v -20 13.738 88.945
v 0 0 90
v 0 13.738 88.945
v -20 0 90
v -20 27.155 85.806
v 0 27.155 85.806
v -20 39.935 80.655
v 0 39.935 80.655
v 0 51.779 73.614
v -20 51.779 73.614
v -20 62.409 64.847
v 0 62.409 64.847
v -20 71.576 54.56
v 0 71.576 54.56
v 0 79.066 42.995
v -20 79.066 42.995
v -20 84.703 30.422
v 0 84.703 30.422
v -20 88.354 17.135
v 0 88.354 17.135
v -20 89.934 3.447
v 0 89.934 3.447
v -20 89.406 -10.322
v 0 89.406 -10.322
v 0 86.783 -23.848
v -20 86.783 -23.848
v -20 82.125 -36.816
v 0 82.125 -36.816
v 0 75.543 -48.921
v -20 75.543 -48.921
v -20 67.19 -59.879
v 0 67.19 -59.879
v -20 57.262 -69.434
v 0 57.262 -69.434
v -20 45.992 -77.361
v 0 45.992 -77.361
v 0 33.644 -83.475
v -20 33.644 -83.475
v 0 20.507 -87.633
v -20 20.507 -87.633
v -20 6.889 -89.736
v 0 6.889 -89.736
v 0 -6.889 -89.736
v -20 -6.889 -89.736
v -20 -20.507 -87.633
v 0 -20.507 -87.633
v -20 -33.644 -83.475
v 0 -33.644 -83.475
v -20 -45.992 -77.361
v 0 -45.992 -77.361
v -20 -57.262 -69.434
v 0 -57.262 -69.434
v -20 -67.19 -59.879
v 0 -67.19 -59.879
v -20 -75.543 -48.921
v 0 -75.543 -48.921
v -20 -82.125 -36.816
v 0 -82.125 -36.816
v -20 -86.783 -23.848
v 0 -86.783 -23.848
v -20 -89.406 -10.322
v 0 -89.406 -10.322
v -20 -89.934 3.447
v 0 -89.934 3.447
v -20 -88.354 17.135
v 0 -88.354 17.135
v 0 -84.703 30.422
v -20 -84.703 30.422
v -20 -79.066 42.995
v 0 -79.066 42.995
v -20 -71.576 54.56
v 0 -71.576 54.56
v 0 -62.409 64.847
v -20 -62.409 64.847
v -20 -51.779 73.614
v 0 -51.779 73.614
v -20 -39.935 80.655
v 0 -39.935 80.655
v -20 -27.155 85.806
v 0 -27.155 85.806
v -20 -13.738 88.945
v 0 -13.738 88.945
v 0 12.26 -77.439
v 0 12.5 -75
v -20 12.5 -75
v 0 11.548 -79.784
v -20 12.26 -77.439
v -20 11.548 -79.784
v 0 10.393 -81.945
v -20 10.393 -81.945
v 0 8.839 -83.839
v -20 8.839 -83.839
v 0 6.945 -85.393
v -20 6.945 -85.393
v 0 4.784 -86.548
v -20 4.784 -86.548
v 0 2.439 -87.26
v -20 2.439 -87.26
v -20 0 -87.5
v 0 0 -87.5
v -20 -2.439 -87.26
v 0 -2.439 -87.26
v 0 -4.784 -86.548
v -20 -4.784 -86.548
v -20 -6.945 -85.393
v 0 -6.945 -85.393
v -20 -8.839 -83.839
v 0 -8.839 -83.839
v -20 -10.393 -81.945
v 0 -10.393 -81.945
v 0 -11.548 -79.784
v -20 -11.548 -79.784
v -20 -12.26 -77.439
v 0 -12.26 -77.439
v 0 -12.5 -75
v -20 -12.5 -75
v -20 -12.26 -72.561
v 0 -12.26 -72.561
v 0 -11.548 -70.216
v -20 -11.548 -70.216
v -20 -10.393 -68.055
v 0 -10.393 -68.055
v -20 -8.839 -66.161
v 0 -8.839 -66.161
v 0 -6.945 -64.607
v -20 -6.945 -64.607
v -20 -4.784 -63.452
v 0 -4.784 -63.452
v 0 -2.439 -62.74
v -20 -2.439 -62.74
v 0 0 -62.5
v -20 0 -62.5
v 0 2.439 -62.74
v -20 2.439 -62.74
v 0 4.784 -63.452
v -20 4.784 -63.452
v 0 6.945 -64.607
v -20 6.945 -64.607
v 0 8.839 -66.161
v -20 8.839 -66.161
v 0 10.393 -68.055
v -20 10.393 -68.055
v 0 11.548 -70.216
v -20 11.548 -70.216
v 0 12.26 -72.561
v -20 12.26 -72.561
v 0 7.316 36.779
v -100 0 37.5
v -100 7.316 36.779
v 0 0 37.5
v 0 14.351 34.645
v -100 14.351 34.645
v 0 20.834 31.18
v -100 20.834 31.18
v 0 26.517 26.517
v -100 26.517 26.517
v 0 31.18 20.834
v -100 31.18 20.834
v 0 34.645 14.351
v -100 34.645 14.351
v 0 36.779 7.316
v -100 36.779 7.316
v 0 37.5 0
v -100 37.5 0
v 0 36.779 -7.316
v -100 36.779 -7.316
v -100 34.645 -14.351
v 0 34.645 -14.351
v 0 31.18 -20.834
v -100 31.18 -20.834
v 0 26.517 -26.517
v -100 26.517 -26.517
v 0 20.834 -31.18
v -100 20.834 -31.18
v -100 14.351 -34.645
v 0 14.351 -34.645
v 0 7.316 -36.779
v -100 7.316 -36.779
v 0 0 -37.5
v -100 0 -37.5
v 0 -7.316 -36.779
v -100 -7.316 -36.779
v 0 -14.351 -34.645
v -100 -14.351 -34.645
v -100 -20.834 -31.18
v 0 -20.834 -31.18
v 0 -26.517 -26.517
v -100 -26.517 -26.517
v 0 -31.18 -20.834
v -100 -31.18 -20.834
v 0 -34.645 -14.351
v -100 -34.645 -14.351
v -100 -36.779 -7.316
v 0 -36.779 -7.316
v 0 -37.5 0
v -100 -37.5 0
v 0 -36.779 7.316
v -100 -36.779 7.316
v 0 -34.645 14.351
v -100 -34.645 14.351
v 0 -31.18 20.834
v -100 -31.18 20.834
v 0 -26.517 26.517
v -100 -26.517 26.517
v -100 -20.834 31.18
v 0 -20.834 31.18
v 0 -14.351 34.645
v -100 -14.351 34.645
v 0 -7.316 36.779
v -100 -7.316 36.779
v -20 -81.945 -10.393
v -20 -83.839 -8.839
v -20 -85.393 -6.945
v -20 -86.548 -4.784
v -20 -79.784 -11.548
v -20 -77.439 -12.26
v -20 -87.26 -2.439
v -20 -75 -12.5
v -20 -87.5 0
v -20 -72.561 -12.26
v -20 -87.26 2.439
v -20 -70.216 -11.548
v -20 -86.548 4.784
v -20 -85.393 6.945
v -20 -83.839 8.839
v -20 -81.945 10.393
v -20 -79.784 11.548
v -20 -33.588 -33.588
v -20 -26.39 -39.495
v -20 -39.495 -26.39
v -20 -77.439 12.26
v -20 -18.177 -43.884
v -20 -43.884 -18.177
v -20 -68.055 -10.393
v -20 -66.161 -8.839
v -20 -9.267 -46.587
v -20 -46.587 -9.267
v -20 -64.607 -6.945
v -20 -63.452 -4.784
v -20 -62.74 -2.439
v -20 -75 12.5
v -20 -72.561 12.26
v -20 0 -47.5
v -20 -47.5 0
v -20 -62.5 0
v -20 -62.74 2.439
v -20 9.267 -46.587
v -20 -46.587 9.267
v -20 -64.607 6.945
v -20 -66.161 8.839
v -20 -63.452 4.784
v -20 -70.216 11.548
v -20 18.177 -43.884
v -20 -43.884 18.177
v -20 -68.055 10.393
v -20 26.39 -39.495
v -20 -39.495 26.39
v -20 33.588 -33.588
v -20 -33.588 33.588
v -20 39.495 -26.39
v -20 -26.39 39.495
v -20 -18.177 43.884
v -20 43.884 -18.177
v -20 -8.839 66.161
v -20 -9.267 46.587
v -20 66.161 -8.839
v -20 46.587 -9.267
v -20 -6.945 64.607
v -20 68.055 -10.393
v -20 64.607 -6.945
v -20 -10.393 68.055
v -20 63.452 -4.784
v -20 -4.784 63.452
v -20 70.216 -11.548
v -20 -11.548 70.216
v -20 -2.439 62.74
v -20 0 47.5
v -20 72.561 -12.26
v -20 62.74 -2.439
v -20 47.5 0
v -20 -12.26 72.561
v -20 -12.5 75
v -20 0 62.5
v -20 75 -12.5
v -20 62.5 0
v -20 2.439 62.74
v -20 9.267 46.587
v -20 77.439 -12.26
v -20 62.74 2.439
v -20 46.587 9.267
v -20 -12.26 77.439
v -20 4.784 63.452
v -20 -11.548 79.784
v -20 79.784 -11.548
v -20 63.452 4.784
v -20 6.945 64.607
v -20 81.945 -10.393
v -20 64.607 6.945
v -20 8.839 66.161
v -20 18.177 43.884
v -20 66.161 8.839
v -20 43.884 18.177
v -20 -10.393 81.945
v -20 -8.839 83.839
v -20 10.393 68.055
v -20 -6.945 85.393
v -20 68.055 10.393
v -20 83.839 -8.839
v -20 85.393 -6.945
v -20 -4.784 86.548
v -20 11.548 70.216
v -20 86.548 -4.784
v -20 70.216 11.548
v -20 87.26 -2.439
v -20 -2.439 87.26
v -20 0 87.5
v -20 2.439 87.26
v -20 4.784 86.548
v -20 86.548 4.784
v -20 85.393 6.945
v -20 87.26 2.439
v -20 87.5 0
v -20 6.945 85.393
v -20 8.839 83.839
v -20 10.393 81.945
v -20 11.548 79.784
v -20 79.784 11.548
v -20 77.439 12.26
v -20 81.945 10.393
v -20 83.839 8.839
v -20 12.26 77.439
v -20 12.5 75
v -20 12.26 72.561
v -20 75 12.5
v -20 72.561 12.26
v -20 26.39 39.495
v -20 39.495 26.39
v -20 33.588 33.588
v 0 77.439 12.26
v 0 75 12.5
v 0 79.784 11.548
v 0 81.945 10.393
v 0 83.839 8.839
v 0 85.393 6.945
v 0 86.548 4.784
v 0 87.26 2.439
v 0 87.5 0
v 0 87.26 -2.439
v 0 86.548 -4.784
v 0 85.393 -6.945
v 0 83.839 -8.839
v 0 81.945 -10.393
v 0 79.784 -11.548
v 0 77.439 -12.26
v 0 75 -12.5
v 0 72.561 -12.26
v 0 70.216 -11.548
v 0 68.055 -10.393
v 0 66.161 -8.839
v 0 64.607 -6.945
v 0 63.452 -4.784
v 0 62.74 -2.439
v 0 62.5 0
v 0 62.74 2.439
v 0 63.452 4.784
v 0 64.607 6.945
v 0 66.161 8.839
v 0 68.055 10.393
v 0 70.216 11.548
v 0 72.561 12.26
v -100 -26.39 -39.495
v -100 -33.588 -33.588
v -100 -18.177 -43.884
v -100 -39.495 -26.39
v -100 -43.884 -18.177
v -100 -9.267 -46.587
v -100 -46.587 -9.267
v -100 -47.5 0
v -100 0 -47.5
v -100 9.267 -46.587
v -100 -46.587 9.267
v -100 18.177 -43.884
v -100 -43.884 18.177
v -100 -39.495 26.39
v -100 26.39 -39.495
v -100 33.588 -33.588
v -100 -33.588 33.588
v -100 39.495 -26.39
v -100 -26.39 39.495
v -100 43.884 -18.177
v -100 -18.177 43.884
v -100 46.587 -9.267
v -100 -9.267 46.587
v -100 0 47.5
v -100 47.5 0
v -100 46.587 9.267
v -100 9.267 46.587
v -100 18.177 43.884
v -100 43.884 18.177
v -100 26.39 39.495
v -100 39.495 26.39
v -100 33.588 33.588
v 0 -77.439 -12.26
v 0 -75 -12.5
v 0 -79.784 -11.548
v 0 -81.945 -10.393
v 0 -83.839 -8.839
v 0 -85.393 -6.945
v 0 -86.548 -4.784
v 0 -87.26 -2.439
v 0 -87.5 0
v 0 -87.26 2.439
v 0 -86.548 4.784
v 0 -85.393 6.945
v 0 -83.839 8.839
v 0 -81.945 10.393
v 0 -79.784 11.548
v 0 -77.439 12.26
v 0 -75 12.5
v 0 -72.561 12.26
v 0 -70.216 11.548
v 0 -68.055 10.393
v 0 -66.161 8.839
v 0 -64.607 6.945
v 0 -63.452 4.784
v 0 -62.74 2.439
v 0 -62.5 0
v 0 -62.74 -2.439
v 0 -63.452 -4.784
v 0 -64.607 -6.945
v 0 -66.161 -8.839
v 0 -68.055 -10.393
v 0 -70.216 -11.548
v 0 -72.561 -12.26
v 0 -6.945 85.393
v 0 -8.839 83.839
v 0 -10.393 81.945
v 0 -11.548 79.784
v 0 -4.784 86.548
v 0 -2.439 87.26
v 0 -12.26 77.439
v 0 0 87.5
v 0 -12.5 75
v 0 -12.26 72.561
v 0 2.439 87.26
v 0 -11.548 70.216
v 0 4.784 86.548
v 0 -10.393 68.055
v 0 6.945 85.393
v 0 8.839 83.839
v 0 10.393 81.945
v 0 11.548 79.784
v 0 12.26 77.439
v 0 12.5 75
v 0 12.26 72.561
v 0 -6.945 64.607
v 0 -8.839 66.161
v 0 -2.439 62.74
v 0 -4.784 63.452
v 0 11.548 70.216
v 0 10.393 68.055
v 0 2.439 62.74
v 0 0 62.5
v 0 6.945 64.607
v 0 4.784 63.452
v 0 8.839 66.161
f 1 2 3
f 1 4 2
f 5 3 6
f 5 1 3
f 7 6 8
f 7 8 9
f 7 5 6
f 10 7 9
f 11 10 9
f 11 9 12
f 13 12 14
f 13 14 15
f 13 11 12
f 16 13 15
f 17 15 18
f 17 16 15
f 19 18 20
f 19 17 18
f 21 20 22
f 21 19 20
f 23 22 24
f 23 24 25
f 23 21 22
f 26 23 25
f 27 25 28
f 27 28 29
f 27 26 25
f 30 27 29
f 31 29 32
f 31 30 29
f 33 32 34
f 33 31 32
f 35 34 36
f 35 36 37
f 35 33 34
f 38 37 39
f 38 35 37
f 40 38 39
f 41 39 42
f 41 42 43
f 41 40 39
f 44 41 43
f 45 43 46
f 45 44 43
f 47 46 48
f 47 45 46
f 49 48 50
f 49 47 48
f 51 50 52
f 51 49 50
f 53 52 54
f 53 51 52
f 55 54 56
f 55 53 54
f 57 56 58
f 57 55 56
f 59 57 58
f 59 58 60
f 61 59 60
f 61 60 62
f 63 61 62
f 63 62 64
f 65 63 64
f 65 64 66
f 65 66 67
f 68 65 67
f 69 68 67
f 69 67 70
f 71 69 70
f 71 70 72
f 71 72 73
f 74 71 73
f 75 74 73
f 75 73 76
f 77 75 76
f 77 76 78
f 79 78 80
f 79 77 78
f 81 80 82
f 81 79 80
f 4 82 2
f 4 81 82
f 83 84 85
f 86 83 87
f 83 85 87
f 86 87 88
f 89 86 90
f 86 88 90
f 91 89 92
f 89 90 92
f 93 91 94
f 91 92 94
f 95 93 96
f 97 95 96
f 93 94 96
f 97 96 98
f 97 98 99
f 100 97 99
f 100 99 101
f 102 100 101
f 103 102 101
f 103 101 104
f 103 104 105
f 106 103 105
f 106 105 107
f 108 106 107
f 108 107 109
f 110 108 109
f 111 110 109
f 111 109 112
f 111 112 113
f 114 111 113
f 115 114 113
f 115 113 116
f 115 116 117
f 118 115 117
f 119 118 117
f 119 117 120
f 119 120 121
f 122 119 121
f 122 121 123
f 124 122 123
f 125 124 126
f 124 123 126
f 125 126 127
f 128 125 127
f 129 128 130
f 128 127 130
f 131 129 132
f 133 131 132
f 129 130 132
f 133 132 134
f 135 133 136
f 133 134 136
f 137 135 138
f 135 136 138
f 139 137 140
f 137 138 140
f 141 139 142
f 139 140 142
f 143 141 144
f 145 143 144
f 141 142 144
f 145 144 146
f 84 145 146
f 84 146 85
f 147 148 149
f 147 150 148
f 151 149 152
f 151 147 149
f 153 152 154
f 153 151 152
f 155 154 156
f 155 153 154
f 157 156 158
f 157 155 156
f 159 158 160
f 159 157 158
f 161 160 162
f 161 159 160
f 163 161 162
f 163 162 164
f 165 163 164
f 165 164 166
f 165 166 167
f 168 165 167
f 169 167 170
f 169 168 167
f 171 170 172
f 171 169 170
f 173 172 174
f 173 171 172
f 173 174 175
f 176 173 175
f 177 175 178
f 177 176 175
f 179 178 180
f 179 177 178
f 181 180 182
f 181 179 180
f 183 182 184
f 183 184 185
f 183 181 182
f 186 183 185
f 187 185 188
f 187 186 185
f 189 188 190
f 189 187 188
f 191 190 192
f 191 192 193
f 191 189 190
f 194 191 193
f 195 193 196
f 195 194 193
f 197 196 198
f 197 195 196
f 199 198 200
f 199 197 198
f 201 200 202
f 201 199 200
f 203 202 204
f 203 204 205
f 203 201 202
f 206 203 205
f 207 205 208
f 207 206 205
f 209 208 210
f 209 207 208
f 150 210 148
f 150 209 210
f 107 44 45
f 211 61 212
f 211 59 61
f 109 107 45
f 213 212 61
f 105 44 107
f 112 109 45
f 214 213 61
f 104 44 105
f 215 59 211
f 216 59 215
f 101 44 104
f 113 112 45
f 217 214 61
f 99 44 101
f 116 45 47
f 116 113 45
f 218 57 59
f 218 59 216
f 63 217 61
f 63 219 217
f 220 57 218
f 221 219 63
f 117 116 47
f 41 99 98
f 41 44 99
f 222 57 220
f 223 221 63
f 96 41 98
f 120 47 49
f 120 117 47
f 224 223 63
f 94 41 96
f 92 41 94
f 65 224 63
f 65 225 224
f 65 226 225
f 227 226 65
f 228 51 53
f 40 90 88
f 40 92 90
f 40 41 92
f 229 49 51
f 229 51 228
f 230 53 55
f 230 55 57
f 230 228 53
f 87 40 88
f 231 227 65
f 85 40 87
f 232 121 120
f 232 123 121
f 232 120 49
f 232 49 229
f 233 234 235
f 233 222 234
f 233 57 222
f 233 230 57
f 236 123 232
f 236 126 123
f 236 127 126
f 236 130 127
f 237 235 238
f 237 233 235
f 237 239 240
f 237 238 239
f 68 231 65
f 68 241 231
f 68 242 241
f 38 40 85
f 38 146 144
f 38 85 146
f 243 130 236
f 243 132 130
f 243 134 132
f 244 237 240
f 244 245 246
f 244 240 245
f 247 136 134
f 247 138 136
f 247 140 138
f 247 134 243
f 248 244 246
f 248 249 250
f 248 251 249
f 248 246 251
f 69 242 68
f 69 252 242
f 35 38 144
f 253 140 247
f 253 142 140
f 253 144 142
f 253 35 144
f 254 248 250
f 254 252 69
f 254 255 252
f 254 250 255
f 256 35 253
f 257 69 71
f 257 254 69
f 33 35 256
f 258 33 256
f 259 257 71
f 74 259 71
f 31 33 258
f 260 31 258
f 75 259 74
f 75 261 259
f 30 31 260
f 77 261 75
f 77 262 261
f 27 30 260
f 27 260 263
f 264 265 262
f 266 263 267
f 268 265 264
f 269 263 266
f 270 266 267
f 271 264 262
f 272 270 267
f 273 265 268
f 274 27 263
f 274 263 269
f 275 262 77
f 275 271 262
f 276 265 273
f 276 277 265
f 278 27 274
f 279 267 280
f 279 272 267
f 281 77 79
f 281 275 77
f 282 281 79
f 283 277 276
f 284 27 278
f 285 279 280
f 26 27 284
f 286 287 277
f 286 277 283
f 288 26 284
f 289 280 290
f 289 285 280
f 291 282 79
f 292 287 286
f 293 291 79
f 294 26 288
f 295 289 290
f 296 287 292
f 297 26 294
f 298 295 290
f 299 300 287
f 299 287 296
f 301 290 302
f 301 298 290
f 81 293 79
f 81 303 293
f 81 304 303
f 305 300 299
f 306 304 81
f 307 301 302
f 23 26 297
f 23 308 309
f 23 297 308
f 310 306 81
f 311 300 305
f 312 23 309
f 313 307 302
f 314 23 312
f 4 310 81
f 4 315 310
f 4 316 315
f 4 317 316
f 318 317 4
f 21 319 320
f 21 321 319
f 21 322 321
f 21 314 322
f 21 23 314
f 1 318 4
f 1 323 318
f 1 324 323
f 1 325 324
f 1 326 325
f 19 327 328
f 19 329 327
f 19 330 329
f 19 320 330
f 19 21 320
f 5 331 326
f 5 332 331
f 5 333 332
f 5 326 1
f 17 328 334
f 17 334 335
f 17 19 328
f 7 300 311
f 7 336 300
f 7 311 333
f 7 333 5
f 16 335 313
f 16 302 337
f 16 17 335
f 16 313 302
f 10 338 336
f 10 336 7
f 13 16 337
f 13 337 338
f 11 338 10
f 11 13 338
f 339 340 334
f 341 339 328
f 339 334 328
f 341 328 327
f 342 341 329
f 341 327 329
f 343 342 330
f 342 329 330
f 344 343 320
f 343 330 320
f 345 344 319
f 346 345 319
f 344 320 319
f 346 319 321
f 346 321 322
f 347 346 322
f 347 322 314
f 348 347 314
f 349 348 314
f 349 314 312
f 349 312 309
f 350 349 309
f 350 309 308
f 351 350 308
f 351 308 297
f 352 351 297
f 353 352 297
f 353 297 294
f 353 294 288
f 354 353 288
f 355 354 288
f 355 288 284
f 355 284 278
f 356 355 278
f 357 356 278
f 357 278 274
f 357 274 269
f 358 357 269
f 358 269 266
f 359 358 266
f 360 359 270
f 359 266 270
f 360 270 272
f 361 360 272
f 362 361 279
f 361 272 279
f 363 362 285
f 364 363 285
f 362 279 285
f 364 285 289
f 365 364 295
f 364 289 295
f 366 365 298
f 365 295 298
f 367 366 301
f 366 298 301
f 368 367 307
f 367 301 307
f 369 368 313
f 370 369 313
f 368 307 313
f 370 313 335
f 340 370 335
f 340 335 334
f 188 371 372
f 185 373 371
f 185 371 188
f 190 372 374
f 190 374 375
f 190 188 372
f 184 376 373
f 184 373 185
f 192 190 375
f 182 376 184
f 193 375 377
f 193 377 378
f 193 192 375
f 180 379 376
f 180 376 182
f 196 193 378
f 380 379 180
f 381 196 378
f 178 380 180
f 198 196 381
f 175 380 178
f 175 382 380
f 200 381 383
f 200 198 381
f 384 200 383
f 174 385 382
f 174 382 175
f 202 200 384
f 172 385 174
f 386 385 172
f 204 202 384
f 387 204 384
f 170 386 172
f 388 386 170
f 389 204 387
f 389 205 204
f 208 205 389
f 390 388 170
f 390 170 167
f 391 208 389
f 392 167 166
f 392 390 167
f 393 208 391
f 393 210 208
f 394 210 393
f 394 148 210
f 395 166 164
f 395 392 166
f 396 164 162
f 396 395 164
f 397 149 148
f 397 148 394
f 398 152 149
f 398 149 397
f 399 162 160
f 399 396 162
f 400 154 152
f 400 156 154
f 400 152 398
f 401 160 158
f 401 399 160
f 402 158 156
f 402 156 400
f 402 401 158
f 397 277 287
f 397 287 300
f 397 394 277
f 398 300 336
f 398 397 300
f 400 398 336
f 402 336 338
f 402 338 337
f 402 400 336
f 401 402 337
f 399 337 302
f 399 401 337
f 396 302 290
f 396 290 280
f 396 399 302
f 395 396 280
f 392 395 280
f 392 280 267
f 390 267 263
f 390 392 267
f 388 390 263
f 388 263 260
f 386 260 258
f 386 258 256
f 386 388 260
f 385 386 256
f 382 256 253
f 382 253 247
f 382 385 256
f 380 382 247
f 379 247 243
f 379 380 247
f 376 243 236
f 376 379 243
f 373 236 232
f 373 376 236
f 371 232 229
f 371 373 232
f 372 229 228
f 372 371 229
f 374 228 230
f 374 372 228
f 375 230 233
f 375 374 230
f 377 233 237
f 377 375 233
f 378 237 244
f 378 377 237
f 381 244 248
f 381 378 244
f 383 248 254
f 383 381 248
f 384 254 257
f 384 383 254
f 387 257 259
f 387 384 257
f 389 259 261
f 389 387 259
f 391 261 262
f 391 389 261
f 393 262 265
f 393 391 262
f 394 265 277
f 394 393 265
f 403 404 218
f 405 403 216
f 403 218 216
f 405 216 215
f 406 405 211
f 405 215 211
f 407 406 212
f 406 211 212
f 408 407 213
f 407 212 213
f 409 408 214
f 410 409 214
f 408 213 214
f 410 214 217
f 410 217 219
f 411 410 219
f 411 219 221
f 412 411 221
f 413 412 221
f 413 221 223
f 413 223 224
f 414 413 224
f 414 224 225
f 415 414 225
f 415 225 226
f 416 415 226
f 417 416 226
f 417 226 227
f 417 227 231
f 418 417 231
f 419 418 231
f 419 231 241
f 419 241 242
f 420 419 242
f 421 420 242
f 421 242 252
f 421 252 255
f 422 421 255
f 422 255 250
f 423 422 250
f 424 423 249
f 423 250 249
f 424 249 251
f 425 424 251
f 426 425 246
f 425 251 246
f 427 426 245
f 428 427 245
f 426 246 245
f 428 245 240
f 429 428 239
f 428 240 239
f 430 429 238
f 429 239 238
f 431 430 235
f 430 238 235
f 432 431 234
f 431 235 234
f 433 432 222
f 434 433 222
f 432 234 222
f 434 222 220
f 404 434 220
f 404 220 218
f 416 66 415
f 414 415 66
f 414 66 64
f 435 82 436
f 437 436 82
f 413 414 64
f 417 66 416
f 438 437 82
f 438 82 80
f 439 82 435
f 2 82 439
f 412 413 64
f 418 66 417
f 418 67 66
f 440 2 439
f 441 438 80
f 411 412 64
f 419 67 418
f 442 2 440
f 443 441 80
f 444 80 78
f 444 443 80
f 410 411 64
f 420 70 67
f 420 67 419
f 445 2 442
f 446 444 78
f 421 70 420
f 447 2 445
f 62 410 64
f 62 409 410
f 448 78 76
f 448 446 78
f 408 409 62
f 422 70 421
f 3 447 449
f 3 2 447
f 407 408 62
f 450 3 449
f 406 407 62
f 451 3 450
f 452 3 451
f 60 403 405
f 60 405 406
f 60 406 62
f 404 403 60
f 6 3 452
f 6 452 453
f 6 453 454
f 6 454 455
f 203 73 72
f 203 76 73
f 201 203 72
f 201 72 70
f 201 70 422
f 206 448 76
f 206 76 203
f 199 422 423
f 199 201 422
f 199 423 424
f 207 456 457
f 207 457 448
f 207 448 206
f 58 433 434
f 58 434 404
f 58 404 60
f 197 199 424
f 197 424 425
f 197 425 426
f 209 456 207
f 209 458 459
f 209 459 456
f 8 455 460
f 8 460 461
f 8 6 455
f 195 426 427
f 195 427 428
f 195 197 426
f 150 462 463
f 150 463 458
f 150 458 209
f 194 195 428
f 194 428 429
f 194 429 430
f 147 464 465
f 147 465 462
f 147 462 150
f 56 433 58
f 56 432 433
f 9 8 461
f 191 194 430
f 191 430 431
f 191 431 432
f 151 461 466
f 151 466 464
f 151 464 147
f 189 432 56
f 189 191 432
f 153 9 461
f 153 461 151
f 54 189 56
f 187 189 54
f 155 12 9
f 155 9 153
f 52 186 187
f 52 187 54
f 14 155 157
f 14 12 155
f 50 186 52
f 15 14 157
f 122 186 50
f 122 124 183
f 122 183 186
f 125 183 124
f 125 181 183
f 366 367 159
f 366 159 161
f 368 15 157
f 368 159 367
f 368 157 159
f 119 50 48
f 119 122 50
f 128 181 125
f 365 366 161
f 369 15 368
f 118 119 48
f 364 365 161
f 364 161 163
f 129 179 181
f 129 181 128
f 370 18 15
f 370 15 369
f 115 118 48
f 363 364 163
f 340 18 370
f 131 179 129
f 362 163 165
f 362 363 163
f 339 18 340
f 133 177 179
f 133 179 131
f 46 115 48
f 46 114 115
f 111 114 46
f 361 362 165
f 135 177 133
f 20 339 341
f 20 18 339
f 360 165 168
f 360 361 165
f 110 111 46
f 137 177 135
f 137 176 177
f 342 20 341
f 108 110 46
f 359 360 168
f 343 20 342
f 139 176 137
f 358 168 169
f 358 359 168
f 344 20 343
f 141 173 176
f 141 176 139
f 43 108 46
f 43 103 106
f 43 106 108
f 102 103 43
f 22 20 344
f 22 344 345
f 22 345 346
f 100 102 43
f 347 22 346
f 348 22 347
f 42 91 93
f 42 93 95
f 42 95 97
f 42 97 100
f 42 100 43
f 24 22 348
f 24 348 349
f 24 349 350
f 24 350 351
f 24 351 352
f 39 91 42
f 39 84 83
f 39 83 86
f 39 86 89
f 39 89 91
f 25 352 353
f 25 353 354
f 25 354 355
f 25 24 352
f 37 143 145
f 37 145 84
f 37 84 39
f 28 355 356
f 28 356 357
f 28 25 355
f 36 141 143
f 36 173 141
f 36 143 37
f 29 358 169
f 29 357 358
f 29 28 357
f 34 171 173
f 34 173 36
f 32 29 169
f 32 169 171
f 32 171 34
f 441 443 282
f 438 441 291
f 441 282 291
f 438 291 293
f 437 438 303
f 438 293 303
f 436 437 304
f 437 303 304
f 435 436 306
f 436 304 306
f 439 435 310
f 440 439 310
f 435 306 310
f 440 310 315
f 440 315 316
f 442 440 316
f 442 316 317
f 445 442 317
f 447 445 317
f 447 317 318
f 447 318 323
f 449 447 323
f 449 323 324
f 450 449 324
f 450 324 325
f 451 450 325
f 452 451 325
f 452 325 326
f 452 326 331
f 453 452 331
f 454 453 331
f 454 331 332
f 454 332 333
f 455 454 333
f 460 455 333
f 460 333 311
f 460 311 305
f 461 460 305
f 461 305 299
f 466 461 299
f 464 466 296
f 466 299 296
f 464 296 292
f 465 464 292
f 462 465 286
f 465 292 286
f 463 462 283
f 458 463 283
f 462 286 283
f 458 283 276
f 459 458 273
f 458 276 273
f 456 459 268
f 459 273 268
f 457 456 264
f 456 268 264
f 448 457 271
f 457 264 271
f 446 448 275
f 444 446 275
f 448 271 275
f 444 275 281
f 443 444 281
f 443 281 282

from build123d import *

# Parameters (mm, degrees)
F2_R            = 12.5
F3_DEPTH        = 20.001
F3_COPIES_COUNT = 4


# Not quite as in the source:
# - a pattern or mirror of a feature is missing from the dataset's text; its kind, count and spacing are read off the source's solid


with BuildPart() as f1:
    # F0 (on Front) → F1 (revolve)
    with BuildSketch(Plane.XZ):
        Polygon((-100, 37.5), (0, 37.5), (0, 90), (-20, 90), (-20, 47.5), (-100, 47.5), align=None)
    revolve(axis=Axis((-86.3388044803, 0, 0), (-1, 0, 0)))

    # F2 (on face) → F3 (cut, through all)
    with BuildSketch(Plane(origin=(-20, 0, 0), x_dir=(0, -1, 0), z_dir=(-1, 0, 0))):
        with Locations((0, 75)):
            Circle(F2_R)
    f3 = extrude(amount=-F3_DEPTH, mode=Mode.SUBTRACT)

    # F3_copies: F3 ×4 about axis
    f3_copies_axis = Axis((0, 0, 0), (1, 0, 0))
    for i in range(1, F3_COPIES_COUNT):
        add(f3.rotate(f3_copies_axis, i * 360 / F3_COPIES_COUNT), mode=Mode.SUBTRACT)


solid = f1.part
